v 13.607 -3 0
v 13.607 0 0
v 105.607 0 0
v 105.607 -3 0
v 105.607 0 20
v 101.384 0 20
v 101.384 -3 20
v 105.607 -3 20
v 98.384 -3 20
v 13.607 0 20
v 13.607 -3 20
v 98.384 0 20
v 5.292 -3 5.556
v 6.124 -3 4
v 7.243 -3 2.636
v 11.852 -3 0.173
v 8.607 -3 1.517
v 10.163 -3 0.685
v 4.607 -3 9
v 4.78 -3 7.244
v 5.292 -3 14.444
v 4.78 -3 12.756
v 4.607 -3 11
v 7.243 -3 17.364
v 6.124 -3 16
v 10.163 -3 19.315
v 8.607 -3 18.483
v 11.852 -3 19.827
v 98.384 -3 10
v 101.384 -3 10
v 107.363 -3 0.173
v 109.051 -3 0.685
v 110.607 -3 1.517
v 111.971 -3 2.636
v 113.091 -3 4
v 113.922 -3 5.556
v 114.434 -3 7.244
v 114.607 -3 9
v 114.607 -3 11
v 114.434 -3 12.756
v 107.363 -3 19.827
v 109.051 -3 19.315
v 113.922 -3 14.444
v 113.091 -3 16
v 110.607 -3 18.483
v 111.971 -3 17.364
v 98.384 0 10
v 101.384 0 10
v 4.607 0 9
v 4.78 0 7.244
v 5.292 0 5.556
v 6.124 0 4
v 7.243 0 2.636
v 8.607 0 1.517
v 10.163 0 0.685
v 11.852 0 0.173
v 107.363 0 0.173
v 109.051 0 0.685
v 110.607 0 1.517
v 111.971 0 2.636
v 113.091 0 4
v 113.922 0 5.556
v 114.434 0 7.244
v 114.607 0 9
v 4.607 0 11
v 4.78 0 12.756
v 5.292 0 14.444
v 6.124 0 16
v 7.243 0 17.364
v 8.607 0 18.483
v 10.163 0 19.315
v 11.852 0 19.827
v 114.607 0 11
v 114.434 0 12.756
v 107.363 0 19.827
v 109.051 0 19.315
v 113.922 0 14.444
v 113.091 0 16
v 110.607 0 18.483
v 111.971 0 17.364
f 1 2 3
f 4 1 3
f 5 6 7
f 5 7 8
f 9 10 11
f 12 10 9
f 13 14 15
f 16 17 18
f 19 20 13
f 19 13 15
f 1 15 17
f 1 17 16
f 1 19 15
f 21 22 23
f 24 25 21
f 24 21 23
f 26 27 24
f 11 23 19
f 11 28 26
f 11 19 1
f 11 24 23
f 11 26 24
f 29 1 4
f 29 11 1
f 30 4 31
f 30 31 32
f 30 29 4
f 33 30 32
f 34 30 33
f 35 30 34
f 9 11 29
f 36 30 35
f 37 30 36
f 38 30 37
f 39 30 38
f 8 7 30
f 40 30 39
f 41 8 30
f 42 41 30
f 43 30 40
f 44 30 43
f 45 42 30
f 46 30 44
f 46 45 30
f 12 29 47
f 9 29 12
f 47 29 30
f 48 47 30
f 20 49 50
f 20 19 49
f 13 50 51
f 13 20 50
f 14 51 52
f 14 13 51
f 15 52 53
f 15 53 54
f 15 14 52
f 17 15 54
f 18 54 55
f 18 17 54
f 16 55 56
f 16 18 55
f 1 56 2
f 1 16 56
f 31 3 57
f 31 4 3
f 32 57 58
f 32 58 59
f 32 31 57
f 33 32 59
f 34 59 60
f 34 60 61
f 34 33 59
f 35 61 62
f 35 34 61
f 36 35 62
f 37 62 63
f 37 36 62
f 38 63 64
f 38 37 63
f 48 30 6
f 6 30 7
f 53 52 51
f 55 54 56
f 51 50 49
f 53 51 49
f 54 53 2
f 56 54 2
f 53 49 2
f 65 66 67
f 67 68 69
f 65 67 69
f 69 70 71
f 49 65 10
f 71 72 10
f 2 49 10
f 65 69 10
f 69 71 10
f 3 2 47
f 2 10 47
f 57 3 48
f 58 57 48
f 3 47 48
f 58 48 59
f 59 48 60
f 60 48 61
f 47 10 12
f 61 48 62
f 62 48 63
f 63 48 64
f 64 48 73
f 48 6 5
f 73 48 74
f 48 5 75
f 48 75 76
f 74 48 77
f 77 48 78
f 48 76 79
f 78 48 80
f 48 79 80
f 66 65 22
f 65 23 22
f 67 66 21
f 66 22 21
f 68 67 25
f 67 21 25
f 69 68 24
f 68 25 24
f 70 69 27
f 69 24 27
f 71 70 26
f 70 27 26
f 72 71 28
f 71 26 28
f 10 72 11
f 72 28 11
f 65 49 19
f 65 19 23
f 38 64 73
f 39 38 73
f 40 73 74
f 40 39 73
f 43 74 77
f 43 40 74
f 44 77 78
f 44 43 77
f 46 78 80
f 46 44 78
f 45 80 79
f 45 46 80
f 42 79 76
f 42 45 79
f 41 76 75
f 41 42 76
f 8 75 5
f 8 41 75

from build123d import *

# Parameters (mm, degrees)
F0_W     = 110
F0_H     = 20
F1_DEPTH = 3
F2_R     = 9
F3_W     = 3
F3_H     = 10
F4_DEPTH = 3


with BuildPart() as f1:
    # F0 (on Front) → F1 (new body)
    with BuildSketch(Plane.XZ):
        with Locations((59.607332, 10)):
            Rectangle(F0_W, F0_H)
    extrude(amount=F1_DEPTH)

    # F2
    f2_edges = [f1.edges().sort_by_distance(p)[0] for p in [
        (4.607332, -1.5, 20),
        (4.607332, -1.5, 0),
        (114.607332, -1.5, 20),
        (114.607332, -1.5, 0),
    ]]
    fillet(f2_edges, radius=F2_R)

    # F3 (on face) → F4 (cut)
    with BuildSketch(Plane.XZ.offset(3)):
        with Locations((99.883784, 15)):
            Rectangle(F3_W, F3_H)
    extrude(amount=-F4_DEPTH, mode=Mode.SUBTRACT)


solid = f1.part
